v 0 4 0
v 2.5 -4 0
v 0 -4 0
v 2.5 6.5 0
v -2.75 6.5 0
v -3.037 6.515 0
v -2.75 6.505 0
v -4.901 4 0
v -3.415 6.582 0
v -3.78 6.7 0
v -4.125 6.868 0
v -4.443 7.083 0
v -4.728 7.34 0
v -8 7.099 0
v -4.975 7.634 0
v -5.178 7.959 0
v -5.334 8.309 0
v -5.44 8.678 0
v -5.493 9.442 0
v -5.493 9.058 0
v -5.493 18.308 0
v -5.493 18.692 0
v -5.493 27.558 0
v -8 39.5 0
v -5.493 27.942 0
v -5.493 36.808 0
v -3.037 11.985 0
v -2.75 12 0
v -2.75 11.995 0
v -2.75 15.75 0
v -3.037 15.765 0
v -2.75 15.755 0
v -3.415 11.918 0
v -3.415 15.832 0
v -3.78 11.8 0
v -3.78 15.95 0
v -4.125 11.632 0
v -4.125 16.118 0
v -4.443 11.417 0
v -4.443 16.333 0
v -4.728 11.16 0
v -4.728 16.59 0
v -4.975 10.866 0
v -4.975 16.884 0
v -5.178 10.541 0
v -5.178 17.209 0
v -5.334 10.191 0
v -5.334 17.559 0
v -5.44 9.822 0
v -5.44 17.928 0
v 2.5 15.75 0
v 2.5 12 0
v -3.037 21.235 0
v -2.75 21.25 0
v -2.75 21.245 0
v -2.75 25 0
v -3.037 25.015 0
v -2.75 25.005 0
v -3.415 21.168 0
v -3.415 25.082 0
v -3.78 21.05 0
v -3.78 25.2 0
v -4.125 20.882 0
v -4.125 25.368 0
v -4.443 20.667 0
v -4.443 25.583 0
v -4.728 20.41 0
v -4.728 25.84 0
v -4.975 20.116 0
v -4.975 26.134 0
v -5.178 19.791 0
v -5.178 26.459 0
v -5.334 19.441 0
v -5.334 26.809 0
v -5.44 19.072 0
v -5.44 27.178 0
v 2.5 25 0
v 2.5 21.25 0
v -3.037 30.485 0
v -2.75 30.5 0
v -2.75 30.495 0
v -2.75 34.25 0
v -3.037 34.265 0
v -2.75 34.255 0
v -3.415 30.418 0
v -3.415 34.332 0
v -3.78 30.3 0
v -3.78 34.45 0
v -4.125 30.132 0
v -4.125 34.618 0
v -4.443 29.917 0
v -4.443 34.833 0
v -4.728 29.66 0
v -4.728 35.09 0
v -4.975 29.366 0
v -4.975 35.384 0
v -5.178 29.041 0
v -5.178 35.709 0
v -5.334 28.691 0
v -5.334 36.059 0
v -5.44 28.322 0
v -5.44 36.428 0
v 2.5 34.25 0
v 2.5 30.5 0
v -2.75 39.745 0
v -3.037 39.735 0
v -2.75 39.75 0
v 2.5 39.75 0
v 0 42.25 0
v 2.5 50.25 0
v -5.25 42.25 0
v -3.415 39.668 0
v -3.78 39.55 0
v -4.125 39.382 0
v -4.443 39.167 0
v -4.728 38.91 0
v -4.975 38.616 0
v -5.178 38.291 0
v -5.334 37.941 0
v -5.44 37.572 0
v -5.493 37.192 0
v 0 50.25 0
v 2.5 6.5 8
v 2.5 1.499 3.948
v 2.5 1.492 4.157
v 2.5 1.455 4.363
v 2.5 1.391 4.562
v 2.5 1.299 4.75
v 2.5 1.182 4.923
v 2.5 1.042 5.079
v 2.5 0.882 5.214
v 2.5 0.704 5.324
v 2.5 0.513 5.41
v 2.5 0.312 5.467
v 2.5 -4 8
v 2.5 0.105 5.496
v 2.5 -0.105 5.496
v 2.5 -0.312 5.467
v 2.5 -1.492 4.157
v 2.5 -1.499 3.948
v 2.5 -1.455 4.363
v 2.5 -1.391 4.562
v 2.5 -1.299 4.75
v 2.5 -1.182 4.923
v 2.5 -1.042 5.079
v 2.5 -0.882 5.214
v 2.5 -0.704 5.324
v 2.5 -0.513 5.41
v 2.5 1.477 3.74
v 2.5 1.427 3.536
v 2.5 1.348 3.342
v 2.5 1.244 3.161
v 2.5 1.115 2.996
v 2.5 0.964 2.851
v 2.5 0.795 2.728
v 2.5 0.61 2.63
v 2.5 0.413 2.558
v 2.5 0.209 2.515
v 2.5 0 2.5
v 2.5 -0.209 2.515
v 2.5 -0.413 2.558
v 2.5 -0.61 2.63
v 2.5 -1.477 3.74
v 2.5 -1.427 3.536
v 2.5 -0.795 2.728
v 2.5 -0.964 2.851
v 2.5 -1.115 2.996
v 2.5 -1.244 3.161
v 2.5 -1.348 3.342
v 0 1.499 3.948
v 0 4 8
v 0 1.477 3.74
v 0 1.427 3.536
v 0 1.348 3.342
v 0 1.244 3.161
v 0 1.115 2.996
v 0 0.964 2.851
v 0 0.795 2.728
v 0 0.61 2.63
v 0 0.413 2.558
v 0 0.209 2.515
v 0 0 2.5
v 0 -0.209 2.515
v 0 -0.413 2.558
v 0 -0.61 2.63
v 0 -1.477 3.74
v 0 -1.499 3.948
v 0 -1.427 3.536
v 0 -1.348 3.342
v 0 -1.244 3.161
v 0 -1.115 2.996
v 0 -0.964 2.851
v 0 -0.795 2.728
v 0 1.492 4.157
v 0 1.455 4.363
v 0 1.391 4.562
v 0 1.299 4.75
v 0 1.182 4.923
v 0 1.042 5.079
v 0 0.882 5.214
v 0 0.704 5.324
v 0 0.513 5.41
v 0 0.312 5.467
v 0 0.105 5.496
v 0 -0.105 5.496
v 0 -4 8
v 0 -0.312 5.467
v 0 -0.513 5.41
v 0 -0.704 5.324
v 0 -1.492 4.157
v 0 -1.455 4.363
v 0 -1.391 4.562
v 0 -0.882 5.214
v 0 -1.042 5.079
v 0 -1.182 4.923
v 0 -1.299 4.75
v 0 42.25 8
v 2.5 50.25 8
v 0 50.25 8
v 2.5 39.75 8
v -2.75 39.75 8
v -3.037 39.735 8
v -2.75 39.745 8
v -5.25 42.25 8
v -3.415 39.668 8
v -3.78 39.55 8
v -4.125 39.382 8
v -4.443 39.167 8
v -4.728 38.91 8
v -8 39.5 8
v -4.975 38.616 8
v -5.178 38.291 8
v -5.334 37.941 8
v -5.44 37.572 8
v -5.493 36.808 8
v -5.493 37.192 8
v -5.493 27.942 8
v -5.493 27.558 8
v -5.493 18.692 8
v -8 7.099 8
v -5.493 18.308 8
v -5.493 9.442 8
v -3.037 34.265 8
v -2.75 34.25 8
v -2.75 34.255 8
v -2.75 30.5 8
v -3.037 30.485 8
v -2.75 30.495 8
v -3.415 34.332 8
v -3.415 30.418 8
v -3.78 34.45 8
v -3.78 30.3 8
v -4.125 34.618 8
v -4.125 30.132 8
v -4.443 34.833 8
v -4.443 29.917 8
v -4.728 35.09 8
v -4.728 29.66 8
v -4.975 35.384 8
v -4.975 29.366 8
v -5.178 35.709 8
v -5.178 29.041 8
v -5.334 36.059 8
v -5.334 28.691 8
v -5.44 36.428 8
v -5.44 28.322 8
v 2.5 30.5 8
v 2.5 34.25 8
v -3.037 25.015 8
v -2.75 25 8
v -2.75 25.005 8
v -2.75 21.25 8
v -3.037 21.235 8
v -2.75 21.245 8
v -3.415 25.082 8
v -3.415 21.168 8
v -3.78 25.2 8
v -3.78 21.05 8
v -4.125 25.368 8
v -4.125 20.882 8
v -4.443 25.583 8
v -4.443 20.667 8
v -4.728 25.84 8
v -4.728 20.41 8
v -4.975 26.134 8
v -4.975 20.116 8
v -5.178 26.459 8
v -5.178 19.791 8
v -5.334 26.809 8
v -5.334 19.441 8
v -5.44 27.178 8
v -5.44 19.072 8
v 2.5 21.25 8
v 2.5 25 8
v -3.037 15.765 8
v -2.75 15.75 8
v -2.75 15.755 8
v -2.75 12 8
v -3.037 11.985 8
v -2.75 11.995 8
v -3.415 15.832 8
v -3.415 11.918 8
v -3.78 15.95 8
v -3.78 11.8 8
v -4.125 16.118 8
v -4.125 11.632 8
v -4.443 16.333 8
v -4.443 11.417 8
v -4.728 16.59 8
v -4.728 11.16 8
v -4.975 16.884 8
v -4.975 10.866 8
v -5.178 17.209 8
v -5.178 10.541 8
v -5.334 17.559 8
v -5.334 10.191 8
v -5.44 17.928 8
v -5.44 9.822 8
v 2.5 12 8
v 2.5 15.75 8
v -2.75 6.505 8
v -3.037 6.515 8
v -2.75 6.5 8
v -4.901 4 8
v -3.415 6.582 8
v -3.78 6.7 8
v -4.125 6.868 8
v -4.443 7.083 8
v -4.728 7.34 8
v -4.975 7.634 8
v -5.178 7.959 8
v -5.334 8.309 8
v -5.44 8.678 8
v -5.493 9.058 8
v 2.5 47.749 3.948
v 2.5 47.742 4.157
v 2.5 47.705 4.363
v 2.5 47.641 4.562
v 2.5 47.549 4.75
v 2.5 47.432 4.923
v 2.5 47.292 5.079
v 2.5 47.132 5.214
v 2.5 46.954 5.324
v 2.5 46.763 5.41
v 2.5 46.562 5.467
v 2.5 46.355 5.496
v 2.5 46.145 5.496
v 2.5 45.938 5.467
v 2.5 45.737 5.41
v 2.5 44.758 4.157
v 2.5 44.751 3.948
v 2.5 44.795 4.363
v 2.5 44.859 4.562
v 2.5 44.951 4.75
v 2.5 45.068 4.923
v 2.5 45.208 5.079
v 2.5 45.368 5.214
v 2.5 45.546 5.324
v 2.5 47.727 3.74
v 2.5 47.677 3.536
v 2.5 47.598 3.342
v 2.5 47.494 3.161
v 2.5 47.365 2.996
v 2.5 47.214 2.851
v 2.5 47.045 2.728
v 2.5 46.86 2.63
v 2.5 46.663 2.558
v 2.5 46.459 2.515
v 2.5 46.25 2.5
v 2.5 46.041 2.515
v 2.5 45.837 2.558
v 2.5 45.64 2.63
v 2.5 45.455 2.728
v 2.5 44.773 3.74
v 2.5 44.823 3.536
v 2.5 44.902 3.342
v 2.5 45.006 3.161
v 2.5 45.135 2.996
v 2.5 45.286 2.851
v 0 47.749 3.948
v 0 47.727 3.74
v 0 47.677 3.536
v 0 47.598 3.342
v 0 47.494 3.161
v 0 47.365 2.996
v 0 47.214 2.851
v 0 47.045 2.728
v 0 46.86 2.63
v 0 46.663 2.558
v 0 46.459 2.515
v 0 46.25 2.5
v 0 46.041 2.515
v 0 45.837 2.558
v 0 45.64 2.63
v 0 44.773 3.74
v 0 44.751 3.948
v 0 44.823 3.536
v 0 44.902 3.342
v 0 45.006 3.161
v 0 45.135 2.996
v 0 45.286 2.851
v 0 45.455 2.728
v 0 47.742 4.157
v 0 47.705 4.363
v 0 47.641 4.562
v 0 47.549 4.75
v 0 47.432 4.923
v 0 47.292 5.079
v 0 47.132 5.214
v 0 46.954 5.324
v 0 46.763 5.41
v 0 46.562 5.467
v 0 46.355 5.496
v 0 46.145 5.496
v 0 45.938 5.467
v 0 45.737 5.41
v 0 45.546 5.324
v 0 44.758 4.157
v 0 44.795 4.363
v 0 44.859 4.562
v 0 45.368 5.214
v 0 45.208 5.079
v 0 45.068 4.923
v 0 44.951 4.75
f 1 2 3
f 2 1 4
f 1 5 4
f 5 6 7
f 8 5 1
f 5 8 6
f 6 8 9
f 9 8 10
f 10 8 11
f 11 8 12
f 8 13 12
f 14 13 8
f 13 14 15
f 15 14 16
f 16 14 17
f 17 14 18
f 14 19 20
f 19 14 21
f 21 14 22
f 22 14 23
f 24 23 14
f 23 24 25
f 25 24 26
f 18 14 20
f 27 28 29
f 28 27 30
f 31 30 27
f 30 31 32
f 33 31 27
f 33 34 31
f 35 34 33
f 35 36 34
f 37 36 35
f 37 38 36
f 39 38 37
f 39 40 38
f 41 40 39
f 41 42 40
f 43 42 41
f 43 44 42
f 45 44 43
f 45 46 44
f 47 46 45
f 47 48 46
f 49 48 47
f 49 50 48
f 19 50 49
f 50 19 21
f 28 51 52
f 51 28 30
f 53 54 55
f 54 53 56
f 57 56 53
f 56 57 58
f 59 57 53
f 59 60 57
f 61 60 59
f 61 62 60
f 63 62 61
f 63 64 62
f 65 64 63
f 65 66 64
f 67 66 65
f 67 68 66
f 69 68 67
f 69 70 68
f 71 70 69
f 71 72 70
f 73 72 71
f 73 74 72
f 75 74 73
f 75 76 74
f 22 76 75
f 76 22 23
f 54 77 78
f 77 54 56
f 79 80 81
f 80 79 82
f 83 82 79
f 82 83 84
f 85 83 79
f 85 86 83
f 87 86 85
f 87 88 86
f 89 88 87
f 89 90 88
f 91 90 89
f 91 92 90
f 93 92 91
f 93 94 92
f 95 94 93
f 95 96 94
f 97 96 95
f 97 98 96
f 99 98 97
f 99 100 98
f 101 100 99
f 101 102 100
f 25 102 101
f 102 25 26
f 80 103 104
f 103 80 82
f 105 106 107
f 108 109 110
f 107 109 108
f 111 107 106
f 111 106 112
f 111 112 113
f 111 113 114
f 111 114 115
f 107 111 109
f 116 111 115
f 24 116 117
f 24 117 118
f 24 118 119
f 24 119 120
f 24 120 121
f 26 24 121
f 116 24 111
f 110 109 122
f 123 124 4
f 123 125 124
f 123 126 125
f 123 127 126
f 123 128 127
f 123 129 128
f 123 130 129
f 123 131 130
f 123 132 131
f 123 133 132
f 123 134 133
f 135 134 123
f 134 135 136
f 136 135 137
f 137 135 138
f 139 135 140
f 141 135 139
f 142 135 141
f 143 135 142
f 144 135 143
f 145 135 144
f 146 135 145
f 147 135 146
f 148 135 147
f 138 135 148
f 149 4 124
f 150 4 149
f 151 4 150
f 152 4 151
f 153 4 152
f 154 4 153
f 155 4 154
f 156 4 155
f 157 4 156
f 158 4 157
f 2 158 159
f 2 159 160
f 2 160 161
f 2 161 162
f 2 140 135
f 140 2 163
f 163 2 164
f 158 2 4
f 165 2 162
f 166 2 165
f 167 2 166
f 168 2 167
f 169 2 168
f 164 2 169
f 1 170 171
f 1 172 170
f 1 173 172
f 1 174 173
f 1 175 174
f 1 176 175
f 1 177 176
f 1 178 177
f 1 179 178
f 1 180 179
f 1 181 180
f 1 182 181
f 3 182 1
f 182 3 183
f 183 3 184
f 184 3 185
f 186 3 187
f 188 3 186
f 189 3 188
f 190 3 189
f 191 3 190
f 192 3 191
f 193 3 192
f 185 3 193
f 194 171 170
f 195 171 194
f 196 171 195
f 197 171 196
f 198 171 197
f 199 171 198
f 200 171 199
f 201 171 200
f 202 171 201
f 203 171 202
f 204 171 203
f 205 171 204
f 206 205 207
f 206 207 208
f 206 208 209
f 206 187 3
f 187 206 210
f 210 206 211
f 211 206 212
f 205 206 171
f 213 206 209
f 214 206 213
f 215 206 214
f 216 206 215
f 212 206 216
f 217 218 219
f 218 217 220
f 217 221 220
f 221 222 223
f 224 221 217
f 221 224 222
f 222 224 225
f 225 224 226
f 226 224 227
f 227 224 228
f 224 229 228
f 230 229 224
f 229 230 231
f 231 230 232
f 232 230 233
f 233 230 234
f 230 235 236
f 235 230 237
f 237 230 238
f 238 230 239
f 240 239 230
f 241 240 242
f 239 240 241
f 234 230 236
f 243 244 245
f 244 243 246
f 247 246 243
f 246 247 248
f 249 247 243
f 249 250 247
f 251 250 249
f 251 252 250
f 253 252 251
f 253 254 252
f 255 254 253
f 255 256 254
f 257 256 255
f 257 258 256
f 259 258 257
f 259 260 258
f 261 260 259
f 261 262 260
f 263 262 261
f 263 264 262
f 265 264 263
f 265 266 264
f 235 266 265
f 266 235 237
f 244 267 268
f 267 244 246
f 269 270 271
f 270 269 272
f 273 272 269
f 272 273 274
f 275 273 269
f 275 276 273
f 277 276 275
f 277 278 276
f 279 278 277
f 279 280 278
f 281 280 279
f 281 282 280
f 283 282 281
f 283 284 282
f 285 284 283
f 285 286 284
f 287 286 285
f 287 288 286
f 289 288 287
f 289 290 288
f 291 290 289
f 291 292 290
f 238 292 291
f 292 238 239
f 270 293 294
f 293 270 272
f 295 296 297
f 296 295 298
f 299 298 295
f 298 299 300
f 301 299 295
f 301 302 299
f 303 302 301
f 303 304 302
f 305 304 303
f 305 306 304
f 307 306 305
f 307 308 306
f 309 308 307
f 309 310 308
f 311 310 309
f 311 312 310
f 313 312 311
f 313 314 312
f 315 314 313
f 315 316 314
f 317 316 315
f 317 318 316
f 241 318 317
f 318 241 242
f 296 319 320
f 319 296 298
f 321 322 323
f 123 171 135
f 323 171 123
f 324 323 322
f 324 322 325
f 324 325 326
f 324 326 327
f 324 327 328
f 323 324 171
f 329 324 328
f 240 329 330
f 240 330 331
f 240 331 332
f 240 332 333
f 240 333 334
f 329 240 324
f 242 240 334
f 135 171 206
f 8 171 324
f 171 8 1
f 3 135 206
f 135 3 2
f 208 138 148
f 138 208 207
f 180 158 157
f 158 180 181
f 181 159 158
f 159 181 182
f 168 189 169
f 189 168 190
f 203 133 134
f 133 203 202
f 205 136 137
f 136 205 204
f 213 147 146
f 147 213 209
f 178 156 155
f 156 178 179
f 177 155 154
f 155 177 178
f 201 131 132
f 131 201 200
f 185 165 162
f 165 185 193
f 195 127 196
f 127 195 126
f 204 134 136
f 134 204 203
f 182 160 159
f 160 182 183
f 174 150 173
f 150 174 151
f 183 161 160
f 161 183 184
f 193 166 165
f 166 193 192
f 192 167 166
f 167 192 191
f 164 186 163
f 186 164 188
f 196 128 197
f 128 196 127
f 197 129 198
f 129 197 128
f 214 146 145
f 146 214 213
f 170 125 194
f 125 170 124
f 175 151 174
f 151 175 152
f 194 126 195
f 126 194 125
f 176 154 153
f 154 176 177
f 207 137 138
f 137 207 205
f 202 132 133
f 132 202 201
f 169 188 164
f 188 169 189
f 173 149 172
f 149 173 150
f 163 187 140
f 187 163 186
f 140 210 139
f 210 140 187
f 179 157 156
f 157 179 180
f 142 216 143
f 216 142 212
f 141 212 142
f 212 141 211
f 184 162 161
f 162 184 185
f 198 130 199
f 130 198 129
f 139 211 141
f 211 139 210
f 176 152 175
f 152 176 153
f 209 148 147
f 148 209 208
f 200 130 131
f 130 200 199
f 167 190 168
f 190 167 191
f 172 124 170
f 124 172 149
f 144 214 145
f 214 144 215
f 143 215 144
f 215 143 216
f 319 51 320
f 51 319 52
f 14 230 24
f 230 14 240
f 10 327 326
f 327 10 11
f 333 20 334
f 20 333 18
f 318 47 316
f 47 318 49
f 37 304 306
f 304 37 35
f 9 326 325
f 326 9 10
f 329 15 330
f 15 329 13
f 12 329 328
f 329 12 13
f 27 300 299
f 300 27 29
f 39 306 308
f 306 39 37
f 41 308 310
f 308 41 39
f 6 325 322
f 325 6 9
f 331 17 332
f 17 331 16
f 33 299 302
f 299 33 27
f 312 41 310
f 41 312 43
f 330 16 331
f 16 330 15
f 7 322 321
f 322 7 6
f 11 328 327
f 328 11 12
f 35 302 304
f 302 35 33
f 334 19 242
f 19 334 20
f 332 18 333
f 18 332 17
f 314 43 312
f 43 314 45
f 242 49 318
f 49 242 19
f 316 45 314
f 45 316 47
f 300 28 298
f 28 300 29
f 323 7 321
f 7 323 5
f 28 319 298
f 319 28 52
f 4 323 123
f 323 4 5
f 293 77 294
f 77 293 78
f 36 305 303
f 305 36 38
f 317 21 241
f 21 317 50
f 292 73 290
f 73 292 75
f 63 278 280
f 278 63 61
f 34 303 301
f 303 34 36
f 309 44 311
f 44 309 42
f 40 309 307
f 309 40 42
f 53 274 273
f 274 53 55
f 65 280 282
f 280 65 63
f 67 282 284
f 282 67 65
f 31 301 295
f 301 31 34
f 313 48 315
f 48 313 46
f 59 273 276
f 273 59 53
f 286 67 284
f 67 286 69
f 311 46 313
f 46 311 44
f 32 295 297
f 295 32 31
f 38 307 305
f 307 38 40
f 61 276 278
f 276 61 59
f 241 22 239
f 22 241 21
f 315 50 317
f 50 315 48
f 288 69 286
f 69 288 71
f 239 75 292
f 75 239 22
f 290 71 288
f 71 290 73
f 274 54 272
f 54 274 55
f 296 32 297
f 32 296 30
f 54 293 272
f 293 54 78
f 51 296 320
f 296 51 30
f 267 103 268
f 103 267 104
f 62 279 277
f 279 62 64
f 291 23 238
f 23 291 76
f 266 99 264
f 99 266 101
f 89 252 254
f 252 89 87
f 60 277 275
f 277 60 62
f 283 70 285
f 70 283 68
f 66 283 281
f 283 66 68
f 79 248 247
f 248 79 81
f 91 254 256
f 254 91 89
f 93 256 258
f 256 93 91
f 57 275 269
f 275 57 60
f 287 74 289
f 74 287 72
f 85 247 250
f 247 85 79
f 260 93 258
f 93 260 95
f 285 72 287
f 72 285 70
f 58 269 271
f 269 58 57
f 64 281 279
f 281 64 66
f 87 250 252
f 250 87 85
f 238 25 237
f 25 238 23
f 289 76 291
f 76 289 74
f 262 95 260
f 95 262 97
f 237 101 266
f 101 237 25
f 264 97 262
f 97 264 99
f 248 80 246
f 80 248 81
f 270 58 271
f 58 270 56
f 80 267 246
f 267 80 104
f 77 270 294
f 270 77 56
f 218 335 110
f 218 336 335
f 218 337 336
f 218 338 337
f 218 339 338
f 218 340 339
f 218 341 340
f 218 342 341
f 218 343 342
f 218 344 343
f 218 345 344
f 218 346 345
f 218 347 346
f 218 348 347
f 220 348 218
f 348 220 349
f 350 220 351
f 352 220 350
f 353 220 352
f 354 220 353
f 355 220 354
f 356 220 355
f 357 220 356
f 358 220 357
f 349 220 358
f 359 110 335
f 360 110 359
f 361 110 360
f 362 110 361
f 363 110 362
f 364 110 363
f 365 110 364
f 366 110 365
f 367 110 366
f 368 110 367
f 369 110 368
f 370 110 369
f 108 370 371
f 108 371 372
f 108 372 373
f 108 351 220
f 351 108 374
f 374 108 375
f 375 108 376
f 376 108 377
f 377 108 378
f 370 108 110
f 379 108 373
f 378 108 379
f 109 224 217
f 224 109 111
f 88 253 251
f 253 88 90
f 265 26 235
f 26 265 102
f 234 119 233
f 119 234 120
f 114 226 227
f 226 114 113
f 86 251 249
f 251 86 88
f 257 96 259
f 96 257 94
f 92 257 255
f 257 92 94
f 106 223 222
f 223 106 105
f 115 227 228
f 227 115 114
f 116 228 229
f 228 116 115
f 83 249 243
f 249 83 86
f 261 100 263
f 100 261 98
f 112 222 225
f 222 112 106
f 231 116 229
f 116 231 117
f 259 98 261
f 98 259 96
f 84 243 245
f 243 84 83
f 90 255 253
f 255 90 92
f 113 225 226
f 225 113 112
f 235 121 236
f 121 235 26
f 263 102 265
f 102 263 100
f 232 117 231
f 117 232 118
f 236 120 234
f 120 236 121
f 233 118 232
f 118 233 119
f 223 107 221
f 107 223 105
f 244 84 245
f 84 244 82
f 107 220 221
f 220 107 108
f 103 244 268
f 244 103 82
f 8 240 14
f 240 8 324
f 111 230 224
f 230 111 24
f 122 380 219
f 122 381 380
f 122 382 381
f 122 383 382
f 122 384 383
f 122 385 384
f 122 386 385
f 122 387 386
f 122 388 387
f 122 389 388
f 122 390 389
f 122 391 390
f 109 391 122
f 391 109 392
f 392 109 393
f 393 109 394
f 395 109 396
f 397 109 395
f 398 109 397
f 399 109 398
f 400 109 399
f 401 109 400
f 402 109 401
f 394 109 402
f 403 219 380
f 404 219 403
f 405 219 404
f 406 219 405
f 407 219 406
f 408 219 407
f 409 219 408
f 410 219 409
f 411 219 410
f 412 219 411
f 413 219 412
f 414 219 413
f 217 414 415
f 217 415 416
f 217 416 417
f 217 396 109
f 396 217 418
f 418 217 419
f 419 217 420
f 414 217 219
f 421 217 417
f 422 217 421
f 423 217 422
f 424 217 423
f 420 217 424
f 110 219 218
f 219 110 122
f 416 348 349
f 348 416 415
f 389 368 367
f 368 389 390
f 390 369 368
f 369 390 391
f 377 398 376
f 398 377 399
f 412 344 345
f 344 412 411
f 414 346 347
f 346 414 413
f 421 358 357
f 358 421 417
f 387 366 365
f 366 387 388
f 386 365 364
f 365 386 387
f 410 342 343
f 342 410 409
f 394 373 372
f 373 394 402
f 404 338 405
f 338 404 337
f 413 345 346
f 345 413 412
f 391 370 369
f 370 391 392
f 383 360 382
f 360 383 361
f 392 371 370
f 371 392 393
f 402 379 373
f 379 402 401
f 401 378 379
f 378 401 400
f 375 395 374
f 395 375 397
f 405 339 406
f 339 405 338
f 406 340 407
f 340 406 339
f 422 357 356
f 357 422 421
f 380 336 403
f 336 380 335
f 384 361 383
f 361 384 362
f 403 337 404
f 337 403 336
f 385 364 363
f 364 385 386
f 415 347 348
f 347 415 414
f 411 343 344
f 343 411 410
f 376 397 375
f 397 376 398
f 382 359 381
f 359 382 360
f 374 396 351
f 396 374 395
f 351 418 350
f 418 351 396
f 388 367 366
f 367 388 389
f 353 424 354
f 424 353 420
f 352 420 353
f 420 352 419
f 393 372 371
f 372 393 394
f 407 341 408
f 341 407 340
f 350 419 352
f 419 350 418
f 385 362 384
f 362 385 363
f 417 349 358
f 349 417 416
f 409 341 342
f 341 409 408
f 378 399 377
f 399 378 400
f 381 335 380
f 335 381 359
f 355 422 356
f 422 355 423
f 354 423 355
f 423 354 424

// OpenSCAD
channel_count = 4;
screw_whole_diameter = 3;
ethernet_cable_diameter = 5.5;

// These should not require change under normal uses.
height = 8;
thickness = 2.5;
chamfer_size = 2;

function channel_width() = ethernet_cable_diameter + thickness*2;
function tab_length() = screw_whole_diameter + thickness*2;

module mount_tab() {
    translate([0,0,thickness/2]) difference() {
        cube([height, tab_length(), thickness], true);
        cylinder(r=screw_whole_diameter/2, h=thickness, $fn=45, center=true);
    }
}

module ethernet_channel() {
    translate([0,0,height/2]) difference() {
        cube([channel_width(), channel_width(), height], true);
        cylinder(r=ethernet_cable_diameter/2, h=height, $fn=45, center=true);
        translate([channel_width()/2,0,0]) cube([channel_width(), ethernet_cable_diameter, height], true);
    }
}


module ethernet_wall_route() {
    union() {
        translate([0,0,height/2]) rotate([0,90,0]) mount_tab();

        difference() {
            union() {
                for (i = [1:channel_count]) {
                    translate([-channel_width()/2 + thickness,i * (tab_length()/2 + channel_width()/2),0])
                        ethernet_channel();
                }
            }

            translate([-channel_width(),-channel_width()/2,0]) rotate([0,0,45])
                cube([channel_width(), channel_width(), height]);

            translate([-channel_width(),channel_count * (tab_length()/2 + channel_width()/2),0]) rotate([0,0,45])
                cube([channel_width(), channel_width(), height]);
        }

        translate([0, (1 + channel_count) * (tab_length()/2 + channel_width()/2),height/2])
            rotate([0,90,0])
                mount_tab();
    }
}

ethernet_wall_route();
